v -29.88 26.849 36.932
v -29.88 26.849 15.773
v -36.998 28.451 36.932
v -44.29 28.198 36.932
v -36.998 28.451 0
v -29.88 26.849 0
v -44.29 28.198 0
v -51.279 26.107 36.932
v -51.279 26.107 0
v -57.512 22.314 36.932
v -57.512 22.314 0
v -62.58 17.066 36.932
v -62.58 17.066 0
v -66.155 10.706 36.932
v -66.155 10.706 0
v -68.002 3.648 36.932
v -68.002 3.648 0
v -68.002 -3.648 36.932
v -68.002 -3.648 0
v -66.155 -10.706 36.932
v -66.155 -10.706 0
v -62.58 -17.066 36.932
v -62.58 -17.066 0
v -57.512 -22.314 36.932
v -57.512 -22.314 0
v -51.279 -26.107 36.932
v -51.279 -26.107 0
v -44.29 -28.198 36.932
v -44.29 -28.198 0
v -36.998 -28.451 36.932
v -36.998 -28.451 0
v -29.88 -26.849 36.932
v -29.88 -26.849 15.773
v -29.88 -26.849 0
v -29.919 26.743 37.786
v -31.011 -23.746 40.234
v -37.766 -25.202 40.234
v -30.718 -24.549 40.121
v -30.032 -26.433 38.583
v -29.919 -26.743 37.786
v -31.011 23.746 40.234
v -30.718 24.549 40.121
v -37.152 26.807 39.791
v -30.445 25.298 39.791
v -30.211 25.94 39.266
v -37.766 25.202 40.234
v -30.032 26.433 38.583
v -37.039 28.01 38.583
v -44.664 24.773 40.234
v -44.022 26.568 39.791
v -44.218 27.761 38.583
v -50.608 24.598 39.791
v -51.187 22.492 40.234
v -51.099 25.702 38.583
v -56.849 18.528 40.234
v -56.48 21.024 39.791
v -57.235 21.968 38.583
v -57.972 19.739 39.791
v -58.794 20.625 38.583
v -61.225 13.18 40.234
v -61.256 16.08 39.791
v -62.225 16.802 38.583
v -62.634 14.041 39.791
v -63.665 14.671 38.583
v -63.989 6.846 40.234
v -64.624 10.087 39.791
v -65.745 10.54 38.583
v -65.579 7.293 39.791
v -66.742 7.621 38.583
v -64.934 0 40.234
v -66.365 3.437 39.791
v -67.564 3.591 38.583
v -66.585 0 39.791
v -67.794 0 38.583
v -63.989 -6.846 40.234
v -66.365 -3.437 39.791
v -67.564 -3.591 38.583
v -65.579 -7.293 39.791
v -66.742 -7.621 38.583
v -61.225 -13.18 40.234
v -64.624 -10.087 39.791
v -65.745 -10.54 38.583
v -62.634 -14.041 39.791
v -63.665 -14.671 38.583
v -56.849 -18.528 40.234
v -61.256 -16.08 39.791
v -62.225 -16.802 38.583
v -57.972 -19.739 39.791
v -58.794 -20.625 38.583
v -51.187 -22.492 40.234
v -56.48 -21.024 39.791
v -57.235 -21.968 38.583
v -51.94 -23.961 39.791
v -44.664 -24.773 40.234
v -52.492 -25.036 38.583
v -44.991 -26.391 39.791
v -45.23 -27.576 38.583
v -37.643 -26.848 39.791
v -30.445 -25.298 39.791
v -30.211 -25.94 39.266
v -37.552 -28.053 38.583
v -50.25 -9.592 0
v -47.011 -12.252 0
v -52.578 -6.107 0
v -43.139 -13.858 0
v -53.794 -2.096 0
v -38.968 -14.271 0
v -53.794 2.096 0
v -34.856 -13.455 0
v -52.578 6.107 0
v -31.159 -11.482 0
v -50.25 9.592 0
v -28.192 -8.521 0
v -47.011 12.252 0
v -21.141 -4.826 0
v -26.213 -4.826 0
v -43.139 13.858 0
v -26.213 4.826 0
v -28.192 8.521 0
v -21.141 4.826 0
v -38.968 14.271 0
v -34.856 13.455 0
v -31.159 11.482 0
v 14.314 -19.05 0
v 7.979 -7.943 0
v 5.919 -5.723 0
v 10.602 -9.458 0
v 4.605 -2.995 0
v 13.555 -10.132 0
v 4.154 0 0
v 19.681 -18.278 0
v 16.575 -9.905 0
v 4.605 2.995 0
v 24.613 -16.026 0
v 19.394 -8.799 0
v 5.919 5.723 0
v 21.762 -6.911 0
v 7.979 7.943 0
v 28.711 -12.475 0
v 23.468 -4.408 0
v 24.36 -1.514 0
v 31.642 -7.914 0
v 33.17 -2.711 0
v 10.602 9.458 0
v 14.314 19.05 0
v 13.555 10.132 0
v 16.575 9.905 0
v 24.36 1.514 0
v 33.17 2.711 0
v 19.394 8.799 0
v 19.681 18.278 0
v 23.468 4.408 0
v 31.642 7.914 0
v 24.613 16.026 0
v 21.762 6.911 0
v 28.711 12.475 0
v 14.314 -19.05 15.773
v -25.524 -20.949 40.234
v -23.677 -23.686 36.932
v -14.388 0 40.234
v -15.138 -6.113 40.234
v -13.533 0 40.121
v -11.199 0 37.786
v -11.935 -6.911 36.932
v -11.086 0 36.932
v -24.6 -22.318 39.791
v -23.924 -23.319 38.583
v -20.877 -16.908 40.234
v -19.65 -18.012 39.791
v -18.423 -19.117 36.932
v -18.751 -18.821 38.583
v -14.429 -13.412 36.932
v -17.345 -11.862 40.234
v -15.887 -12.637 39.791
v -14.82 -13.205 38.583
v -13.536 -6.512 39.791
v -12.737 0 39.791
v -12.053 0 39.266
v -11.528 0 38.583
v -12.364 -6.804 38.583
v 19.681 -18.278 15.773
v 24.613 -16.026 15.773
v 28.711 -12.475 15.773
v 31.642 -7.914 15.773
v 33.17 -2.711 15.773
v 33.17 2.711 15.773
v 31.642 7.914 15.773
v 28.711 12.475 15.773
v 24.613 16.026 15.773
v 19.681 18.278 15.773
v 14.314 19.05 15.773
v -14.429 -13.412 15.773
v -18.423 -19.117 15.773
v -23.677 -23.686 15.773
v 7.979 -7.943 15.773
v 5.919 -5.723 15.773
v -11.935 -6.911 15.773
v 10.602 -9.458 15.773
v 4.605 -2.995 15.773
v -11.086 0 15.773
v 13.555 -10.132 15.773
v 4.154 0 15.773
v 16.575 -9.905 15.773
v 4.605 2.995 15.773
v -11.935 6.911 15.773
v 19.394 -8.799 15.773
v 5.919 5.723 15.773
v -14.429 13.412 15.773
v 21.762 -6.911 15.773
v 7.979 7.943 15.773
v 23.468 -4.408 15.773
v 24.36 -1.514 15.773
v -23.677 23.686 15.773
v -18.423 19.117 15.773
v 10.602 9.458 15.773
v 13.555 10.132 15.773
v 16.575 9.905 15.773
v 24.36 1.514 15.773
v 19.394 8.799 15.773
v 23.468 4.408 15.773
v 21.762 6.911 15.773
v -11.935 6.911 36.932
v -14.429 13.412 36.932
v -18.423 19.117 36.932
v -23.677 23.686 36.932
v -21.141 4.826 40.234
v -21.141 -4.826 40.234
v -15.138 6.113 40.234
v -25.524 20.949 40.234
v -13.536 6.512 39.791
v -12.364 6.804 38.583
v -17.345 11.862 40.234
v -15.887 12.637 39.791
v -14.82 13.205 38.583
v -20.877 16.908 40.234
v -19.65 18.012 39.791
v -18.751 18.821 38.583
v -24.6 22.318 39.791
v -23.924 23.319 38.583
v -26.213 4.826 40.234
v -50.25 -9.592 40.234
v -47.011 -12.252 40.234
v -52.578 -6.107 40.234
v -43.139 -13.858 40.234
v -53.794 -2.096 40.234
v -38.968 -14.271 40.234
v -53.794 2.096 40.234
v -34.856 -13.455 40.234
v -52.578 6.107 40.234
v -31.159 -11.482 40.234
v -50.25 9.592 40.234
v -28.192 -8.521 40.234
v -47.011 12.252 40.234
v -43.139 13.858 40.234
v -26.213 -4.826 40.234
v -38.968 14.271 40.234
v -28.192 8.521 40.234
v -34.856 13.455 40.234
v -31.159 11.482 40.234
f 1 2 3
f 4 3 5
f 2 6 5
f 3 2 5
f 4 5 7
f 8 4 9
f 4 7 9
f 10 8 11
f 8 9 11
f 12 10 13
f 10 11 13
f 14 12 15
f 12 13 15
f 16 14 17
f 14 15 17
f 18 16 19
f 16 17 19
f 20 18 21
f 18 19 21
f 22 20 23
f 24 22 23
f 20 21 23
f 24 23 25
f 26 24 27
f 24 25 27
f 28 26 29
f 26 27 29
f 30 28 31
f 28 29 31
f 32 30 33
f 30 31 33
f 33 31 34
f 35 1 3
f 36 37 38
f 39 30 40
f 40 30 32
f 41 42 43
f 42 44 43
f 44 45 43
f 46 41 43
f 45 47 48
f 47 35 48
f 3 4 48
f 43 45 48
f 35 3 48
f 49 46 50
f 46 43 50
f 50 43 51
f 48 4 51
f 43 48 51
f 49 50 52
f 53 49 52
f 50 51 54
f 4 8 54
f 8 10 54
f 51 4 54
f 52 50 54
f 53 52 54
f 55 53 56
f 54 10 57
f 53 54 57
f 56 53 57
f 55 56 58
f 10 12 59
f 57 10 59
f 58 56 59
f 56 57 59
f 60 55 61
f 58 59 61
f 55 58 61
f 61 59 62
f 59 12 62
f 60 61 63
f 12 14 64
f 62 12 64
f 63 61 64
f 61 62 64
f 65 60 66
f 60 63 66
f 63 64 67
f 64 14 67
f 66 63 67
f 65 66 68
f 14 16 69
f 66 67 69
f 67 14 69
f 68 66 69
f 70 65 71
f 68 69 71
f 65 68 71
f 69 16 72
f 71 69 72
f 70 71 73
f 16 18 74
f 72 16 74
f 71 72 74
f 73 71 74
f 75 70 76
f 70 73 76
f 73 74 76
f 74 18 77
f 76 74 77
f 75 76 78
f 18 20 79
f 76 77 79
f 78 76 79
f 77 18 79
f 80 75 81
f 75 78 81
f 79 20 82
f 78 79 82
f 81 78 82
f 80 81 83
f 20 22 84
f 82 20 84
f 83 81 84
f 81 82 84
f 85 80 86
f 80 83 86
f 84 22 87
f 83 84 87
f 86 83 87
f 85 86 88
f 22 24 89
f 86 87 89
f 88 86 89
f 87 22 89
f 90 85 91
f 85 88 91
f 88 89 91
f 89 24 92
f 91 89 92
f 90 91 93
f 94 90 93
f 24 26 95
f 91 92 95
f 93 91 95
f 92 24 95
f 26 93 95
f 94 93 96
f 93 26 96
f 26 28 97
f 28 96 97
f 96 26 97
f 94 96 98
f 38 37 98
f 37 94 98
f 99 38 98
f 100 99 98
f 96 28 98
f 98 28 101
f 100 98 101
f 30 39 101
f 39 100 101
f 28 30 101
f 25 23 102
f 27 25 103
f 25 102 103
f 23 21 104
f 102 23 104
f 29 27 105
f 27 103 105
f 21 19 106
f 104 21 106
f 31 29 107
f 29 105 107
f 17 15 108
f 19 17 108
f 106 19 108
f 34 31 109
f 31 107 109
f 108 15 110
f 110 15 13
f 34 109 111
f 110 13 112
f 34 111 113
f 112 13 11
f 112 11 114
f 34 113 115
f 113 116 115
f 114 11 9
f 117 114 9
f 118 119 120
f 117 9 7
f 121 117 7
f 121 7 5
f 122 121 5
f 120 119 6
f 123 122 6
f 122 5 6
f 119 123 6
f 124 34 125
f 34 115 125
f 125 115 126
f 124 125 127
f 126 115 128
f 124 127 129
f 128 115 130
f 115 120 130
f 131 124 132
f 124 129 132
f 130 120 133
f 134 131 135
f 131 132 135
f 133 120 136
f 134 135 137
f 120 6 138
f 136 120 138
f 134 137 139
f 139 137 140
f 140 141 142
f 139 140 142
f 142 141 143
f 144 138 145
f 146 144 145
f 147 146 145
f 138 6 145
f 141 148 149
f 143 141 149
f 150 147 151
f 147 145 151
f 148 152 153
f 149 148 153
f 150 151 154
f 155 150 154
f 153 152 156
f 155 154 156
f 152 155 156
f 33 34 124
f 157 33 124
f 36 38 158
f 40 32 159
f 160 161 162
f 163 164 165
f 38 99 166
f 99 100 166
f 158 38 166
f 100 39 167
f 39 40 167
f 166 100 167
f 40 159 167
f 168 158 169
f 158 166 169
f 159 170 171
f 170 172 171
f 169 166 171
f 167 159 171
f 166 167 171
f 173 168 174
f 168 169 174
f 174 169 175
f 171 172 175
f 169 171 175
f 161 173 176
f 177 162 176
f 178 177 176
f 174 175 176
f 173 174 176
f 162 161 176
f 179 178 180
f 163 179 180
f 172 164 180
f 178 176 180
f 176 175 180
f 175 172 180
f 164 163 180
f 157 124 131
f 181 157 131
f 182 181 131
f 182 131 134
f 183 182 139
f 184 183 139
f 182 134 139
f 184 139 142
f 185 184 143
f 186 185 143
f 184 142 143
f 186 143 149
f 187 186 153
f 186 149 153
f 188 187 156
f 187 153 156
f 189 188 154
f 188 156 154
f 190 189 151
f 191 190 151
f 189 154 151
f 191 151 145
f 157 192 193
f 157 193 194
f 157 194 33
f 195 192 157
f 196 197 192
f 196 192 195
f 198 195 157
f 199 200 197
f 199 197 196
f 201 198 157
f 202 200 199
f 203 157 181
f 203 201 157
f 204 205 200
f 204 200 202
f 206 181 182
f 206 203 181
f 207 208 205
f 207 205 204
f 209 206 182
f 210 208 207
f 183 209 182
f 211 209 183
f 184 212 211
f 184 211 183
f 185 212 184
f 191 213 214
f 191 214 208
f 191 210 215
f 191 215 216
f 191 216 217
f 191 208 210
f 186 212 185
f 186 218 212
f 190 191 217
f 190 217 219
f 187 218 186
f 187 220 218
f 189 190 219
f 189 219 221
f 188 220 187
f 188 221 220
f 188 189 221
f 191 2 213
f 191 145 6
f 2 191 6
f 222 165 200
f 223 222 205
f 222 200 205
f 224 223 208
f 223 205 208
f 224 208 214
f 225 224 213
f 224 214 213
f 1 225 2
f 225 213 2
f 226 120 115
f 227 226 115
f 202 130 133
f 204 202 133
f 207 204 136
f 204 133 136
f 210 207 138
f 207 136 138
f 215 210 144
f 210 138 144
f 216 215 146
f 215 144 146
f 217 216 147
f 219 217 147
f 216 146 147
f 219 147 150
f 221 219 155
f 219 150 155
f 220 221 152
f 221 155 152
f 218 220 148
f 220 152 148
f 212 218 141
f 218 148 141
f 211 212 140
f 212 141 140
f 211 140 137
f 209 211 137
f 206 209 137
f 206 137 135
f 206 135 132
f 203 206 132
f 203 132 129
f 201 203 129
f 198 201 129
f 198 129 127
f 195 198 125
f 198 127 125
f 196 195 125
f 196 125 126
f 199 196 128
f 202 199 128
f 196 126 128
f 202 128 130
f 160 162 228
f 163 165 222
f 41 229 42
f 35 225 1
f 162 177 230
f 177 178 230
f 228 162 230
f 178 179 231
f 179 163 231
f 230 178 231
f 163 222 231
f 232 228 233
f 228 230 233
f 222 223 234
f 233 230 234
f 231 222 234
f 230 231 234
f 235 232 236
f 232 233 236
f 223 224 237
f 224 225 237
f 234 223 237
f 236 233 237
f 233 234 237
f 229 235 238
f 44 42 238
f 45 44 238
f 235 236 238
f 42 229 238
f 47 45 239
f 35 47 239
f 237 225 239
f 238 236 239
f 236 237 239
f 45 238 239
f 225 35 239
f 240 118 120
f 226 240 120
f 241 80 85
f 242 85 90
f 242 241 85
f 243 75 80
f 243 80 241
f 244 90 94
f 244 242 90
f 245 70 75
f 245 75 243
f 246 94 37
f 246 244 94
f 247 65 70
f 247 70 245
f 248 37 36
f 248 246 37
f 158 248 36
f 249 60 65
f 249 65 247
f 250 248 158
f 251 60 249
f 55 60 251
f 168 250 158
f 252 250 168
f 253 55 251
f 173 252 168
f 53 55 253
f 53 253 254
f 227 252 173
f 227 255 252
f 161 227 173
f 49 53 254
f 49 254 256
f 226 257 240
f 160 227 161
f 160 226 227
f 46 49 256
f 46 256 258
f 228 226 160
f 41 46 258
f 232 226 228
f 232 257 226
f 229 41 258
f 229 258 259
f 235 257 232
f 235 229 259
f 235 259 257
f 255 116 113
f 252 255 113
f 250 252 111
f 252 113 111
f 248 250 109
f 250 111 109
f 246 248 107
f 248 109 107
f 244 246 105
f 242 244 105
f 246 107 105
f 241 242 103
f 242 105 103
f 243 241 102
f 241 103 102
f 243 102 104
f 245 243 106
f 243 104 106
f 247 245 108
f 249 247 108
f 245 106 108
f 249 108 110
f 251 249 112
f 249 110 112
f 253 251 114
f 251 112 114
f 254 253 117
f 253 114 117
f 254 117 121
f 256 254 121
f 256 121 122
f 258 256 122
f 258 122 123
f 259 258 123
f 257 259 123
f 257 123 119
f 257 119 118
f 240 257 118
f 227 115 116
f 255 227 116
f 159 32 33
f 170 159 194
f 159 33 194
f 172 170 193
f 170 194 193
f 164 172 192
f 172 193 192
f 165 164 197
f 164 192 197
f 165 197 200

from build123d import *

# Parameters (mm, degrees)
F1_DEPTH = 40.2336
F2_DEPTH = 15.7734
F3_R     = 3.302


with BuildPart() as f1:
    # F0 (on Top) → F1 (new body)
    with BuildSketch(Plane.XY):
        with BuildLine():
            ThreePointArc((-29.8803903858, -26.8489932886), (-16.251542955, -16.3866864902), (-11.0860950838, 0))
            ThreePointArc((-11.0860950838, 0), (-16.251542955, 16.3866864902), (-29.8803903858, 26.8489932886))
            ThreePointArc((-29.8803903858, 26.8489932886), (-68.2360950838, 0), (-29.8803903858, -26.8489932886))
        make_face()
        with BuildLine():
            Line((-21.1405511945, 4.826), (-21.1405511945, 0))
            Line((-21.1405511945, 0), (-21.1405511945, -4.826))
            Line((-21.1405511945, -4.826), (-26.2133302045, -4.826))
            ThreePointArc((-26.2133302045, -4.826), (-53.9485950838, 0), (-26.2133302045, 4.826))
            Line((-26.2133302045, 4.826), (-21.1405511945, 4.826))
        make_face(mode=Mode.SUBTRACT)
    extrude(amount=F1_DEPTH)

    # F0 (on Top) → F2 (join)
    with BuildSketch(Plane.XY):
        with BuildLine():
            ThreePointArc((-29.8803903858, -26.8489932886), (-16.251542955, -16.3866864902), (-11.0860950838, 0))
            ThreePointArc((-11.0860950838, 0), (-16.251542955, 16.3866864902), (-29.8803903858, 26.8489932886))
            ThreePointArc((-29.8803903858, 26.8489932886), (-68.2360950838, 0), (-29.8803903858, -26.8489932886))
        make_face()
        with BuildLine():
            Line((-21.1405511945, 4.826), (-21.1405511945, 0))
            Line((-21.1405511945, 0), (-21.1405511945, -4.826))
            Line((-21.1405511945, -4.826), (-26.2133302045, -4.826))
            ThreePointArc((-26.2133302045, -4.826), (-53.9485950838, 0), (-26.2133302045, 4.826))
            Line((-26.2133302045, 4.826), (-21.1405511945, 4.826))
        make_face(mode=Mode.SUBTRACT)
        with BuildLine():
            ThreePointArc((-29.8803903858, 26.8489932886), (-16.251542955, 16.3866864902), (-11.0860950838, 0))
            ThreePointArc((-11.0860950838, 0), (-16.251542955, -16.3866864902), (-29.8803903858, -26.8489932886))
            Line((-29.8803903858, -26.8489932886), (14.3139049162, -19.05))
            ThreePointArc((14.3139049162, -19.05), (33.3639049162, 0), (14.3139049162, 19.05))
            Line((14.3139049162, 19.05), (-29.8803903858, 26.8489932886))
        make_face()
        with BuildLine():
            ThreePointArc((24.4739049162, 0), (14.3139049162, -10.16), (4.1539049162, 0))
            ThreePointArc((4.1539049162, 0), (14.3139049162, 10.16), (24.4739049162, 0))
        make_face(mode=Mode.SUBTRACT)
    extrude(amount=F2_DEPTH)

    # F3
    f3_edges = [f1.edges().sort_by_distance(p)[0] for p in [
        (-49.4418, 26.848993, 40.2336),
    ]]
    fillet(f3_edges, radius=F3_R)


solid = f1.part
